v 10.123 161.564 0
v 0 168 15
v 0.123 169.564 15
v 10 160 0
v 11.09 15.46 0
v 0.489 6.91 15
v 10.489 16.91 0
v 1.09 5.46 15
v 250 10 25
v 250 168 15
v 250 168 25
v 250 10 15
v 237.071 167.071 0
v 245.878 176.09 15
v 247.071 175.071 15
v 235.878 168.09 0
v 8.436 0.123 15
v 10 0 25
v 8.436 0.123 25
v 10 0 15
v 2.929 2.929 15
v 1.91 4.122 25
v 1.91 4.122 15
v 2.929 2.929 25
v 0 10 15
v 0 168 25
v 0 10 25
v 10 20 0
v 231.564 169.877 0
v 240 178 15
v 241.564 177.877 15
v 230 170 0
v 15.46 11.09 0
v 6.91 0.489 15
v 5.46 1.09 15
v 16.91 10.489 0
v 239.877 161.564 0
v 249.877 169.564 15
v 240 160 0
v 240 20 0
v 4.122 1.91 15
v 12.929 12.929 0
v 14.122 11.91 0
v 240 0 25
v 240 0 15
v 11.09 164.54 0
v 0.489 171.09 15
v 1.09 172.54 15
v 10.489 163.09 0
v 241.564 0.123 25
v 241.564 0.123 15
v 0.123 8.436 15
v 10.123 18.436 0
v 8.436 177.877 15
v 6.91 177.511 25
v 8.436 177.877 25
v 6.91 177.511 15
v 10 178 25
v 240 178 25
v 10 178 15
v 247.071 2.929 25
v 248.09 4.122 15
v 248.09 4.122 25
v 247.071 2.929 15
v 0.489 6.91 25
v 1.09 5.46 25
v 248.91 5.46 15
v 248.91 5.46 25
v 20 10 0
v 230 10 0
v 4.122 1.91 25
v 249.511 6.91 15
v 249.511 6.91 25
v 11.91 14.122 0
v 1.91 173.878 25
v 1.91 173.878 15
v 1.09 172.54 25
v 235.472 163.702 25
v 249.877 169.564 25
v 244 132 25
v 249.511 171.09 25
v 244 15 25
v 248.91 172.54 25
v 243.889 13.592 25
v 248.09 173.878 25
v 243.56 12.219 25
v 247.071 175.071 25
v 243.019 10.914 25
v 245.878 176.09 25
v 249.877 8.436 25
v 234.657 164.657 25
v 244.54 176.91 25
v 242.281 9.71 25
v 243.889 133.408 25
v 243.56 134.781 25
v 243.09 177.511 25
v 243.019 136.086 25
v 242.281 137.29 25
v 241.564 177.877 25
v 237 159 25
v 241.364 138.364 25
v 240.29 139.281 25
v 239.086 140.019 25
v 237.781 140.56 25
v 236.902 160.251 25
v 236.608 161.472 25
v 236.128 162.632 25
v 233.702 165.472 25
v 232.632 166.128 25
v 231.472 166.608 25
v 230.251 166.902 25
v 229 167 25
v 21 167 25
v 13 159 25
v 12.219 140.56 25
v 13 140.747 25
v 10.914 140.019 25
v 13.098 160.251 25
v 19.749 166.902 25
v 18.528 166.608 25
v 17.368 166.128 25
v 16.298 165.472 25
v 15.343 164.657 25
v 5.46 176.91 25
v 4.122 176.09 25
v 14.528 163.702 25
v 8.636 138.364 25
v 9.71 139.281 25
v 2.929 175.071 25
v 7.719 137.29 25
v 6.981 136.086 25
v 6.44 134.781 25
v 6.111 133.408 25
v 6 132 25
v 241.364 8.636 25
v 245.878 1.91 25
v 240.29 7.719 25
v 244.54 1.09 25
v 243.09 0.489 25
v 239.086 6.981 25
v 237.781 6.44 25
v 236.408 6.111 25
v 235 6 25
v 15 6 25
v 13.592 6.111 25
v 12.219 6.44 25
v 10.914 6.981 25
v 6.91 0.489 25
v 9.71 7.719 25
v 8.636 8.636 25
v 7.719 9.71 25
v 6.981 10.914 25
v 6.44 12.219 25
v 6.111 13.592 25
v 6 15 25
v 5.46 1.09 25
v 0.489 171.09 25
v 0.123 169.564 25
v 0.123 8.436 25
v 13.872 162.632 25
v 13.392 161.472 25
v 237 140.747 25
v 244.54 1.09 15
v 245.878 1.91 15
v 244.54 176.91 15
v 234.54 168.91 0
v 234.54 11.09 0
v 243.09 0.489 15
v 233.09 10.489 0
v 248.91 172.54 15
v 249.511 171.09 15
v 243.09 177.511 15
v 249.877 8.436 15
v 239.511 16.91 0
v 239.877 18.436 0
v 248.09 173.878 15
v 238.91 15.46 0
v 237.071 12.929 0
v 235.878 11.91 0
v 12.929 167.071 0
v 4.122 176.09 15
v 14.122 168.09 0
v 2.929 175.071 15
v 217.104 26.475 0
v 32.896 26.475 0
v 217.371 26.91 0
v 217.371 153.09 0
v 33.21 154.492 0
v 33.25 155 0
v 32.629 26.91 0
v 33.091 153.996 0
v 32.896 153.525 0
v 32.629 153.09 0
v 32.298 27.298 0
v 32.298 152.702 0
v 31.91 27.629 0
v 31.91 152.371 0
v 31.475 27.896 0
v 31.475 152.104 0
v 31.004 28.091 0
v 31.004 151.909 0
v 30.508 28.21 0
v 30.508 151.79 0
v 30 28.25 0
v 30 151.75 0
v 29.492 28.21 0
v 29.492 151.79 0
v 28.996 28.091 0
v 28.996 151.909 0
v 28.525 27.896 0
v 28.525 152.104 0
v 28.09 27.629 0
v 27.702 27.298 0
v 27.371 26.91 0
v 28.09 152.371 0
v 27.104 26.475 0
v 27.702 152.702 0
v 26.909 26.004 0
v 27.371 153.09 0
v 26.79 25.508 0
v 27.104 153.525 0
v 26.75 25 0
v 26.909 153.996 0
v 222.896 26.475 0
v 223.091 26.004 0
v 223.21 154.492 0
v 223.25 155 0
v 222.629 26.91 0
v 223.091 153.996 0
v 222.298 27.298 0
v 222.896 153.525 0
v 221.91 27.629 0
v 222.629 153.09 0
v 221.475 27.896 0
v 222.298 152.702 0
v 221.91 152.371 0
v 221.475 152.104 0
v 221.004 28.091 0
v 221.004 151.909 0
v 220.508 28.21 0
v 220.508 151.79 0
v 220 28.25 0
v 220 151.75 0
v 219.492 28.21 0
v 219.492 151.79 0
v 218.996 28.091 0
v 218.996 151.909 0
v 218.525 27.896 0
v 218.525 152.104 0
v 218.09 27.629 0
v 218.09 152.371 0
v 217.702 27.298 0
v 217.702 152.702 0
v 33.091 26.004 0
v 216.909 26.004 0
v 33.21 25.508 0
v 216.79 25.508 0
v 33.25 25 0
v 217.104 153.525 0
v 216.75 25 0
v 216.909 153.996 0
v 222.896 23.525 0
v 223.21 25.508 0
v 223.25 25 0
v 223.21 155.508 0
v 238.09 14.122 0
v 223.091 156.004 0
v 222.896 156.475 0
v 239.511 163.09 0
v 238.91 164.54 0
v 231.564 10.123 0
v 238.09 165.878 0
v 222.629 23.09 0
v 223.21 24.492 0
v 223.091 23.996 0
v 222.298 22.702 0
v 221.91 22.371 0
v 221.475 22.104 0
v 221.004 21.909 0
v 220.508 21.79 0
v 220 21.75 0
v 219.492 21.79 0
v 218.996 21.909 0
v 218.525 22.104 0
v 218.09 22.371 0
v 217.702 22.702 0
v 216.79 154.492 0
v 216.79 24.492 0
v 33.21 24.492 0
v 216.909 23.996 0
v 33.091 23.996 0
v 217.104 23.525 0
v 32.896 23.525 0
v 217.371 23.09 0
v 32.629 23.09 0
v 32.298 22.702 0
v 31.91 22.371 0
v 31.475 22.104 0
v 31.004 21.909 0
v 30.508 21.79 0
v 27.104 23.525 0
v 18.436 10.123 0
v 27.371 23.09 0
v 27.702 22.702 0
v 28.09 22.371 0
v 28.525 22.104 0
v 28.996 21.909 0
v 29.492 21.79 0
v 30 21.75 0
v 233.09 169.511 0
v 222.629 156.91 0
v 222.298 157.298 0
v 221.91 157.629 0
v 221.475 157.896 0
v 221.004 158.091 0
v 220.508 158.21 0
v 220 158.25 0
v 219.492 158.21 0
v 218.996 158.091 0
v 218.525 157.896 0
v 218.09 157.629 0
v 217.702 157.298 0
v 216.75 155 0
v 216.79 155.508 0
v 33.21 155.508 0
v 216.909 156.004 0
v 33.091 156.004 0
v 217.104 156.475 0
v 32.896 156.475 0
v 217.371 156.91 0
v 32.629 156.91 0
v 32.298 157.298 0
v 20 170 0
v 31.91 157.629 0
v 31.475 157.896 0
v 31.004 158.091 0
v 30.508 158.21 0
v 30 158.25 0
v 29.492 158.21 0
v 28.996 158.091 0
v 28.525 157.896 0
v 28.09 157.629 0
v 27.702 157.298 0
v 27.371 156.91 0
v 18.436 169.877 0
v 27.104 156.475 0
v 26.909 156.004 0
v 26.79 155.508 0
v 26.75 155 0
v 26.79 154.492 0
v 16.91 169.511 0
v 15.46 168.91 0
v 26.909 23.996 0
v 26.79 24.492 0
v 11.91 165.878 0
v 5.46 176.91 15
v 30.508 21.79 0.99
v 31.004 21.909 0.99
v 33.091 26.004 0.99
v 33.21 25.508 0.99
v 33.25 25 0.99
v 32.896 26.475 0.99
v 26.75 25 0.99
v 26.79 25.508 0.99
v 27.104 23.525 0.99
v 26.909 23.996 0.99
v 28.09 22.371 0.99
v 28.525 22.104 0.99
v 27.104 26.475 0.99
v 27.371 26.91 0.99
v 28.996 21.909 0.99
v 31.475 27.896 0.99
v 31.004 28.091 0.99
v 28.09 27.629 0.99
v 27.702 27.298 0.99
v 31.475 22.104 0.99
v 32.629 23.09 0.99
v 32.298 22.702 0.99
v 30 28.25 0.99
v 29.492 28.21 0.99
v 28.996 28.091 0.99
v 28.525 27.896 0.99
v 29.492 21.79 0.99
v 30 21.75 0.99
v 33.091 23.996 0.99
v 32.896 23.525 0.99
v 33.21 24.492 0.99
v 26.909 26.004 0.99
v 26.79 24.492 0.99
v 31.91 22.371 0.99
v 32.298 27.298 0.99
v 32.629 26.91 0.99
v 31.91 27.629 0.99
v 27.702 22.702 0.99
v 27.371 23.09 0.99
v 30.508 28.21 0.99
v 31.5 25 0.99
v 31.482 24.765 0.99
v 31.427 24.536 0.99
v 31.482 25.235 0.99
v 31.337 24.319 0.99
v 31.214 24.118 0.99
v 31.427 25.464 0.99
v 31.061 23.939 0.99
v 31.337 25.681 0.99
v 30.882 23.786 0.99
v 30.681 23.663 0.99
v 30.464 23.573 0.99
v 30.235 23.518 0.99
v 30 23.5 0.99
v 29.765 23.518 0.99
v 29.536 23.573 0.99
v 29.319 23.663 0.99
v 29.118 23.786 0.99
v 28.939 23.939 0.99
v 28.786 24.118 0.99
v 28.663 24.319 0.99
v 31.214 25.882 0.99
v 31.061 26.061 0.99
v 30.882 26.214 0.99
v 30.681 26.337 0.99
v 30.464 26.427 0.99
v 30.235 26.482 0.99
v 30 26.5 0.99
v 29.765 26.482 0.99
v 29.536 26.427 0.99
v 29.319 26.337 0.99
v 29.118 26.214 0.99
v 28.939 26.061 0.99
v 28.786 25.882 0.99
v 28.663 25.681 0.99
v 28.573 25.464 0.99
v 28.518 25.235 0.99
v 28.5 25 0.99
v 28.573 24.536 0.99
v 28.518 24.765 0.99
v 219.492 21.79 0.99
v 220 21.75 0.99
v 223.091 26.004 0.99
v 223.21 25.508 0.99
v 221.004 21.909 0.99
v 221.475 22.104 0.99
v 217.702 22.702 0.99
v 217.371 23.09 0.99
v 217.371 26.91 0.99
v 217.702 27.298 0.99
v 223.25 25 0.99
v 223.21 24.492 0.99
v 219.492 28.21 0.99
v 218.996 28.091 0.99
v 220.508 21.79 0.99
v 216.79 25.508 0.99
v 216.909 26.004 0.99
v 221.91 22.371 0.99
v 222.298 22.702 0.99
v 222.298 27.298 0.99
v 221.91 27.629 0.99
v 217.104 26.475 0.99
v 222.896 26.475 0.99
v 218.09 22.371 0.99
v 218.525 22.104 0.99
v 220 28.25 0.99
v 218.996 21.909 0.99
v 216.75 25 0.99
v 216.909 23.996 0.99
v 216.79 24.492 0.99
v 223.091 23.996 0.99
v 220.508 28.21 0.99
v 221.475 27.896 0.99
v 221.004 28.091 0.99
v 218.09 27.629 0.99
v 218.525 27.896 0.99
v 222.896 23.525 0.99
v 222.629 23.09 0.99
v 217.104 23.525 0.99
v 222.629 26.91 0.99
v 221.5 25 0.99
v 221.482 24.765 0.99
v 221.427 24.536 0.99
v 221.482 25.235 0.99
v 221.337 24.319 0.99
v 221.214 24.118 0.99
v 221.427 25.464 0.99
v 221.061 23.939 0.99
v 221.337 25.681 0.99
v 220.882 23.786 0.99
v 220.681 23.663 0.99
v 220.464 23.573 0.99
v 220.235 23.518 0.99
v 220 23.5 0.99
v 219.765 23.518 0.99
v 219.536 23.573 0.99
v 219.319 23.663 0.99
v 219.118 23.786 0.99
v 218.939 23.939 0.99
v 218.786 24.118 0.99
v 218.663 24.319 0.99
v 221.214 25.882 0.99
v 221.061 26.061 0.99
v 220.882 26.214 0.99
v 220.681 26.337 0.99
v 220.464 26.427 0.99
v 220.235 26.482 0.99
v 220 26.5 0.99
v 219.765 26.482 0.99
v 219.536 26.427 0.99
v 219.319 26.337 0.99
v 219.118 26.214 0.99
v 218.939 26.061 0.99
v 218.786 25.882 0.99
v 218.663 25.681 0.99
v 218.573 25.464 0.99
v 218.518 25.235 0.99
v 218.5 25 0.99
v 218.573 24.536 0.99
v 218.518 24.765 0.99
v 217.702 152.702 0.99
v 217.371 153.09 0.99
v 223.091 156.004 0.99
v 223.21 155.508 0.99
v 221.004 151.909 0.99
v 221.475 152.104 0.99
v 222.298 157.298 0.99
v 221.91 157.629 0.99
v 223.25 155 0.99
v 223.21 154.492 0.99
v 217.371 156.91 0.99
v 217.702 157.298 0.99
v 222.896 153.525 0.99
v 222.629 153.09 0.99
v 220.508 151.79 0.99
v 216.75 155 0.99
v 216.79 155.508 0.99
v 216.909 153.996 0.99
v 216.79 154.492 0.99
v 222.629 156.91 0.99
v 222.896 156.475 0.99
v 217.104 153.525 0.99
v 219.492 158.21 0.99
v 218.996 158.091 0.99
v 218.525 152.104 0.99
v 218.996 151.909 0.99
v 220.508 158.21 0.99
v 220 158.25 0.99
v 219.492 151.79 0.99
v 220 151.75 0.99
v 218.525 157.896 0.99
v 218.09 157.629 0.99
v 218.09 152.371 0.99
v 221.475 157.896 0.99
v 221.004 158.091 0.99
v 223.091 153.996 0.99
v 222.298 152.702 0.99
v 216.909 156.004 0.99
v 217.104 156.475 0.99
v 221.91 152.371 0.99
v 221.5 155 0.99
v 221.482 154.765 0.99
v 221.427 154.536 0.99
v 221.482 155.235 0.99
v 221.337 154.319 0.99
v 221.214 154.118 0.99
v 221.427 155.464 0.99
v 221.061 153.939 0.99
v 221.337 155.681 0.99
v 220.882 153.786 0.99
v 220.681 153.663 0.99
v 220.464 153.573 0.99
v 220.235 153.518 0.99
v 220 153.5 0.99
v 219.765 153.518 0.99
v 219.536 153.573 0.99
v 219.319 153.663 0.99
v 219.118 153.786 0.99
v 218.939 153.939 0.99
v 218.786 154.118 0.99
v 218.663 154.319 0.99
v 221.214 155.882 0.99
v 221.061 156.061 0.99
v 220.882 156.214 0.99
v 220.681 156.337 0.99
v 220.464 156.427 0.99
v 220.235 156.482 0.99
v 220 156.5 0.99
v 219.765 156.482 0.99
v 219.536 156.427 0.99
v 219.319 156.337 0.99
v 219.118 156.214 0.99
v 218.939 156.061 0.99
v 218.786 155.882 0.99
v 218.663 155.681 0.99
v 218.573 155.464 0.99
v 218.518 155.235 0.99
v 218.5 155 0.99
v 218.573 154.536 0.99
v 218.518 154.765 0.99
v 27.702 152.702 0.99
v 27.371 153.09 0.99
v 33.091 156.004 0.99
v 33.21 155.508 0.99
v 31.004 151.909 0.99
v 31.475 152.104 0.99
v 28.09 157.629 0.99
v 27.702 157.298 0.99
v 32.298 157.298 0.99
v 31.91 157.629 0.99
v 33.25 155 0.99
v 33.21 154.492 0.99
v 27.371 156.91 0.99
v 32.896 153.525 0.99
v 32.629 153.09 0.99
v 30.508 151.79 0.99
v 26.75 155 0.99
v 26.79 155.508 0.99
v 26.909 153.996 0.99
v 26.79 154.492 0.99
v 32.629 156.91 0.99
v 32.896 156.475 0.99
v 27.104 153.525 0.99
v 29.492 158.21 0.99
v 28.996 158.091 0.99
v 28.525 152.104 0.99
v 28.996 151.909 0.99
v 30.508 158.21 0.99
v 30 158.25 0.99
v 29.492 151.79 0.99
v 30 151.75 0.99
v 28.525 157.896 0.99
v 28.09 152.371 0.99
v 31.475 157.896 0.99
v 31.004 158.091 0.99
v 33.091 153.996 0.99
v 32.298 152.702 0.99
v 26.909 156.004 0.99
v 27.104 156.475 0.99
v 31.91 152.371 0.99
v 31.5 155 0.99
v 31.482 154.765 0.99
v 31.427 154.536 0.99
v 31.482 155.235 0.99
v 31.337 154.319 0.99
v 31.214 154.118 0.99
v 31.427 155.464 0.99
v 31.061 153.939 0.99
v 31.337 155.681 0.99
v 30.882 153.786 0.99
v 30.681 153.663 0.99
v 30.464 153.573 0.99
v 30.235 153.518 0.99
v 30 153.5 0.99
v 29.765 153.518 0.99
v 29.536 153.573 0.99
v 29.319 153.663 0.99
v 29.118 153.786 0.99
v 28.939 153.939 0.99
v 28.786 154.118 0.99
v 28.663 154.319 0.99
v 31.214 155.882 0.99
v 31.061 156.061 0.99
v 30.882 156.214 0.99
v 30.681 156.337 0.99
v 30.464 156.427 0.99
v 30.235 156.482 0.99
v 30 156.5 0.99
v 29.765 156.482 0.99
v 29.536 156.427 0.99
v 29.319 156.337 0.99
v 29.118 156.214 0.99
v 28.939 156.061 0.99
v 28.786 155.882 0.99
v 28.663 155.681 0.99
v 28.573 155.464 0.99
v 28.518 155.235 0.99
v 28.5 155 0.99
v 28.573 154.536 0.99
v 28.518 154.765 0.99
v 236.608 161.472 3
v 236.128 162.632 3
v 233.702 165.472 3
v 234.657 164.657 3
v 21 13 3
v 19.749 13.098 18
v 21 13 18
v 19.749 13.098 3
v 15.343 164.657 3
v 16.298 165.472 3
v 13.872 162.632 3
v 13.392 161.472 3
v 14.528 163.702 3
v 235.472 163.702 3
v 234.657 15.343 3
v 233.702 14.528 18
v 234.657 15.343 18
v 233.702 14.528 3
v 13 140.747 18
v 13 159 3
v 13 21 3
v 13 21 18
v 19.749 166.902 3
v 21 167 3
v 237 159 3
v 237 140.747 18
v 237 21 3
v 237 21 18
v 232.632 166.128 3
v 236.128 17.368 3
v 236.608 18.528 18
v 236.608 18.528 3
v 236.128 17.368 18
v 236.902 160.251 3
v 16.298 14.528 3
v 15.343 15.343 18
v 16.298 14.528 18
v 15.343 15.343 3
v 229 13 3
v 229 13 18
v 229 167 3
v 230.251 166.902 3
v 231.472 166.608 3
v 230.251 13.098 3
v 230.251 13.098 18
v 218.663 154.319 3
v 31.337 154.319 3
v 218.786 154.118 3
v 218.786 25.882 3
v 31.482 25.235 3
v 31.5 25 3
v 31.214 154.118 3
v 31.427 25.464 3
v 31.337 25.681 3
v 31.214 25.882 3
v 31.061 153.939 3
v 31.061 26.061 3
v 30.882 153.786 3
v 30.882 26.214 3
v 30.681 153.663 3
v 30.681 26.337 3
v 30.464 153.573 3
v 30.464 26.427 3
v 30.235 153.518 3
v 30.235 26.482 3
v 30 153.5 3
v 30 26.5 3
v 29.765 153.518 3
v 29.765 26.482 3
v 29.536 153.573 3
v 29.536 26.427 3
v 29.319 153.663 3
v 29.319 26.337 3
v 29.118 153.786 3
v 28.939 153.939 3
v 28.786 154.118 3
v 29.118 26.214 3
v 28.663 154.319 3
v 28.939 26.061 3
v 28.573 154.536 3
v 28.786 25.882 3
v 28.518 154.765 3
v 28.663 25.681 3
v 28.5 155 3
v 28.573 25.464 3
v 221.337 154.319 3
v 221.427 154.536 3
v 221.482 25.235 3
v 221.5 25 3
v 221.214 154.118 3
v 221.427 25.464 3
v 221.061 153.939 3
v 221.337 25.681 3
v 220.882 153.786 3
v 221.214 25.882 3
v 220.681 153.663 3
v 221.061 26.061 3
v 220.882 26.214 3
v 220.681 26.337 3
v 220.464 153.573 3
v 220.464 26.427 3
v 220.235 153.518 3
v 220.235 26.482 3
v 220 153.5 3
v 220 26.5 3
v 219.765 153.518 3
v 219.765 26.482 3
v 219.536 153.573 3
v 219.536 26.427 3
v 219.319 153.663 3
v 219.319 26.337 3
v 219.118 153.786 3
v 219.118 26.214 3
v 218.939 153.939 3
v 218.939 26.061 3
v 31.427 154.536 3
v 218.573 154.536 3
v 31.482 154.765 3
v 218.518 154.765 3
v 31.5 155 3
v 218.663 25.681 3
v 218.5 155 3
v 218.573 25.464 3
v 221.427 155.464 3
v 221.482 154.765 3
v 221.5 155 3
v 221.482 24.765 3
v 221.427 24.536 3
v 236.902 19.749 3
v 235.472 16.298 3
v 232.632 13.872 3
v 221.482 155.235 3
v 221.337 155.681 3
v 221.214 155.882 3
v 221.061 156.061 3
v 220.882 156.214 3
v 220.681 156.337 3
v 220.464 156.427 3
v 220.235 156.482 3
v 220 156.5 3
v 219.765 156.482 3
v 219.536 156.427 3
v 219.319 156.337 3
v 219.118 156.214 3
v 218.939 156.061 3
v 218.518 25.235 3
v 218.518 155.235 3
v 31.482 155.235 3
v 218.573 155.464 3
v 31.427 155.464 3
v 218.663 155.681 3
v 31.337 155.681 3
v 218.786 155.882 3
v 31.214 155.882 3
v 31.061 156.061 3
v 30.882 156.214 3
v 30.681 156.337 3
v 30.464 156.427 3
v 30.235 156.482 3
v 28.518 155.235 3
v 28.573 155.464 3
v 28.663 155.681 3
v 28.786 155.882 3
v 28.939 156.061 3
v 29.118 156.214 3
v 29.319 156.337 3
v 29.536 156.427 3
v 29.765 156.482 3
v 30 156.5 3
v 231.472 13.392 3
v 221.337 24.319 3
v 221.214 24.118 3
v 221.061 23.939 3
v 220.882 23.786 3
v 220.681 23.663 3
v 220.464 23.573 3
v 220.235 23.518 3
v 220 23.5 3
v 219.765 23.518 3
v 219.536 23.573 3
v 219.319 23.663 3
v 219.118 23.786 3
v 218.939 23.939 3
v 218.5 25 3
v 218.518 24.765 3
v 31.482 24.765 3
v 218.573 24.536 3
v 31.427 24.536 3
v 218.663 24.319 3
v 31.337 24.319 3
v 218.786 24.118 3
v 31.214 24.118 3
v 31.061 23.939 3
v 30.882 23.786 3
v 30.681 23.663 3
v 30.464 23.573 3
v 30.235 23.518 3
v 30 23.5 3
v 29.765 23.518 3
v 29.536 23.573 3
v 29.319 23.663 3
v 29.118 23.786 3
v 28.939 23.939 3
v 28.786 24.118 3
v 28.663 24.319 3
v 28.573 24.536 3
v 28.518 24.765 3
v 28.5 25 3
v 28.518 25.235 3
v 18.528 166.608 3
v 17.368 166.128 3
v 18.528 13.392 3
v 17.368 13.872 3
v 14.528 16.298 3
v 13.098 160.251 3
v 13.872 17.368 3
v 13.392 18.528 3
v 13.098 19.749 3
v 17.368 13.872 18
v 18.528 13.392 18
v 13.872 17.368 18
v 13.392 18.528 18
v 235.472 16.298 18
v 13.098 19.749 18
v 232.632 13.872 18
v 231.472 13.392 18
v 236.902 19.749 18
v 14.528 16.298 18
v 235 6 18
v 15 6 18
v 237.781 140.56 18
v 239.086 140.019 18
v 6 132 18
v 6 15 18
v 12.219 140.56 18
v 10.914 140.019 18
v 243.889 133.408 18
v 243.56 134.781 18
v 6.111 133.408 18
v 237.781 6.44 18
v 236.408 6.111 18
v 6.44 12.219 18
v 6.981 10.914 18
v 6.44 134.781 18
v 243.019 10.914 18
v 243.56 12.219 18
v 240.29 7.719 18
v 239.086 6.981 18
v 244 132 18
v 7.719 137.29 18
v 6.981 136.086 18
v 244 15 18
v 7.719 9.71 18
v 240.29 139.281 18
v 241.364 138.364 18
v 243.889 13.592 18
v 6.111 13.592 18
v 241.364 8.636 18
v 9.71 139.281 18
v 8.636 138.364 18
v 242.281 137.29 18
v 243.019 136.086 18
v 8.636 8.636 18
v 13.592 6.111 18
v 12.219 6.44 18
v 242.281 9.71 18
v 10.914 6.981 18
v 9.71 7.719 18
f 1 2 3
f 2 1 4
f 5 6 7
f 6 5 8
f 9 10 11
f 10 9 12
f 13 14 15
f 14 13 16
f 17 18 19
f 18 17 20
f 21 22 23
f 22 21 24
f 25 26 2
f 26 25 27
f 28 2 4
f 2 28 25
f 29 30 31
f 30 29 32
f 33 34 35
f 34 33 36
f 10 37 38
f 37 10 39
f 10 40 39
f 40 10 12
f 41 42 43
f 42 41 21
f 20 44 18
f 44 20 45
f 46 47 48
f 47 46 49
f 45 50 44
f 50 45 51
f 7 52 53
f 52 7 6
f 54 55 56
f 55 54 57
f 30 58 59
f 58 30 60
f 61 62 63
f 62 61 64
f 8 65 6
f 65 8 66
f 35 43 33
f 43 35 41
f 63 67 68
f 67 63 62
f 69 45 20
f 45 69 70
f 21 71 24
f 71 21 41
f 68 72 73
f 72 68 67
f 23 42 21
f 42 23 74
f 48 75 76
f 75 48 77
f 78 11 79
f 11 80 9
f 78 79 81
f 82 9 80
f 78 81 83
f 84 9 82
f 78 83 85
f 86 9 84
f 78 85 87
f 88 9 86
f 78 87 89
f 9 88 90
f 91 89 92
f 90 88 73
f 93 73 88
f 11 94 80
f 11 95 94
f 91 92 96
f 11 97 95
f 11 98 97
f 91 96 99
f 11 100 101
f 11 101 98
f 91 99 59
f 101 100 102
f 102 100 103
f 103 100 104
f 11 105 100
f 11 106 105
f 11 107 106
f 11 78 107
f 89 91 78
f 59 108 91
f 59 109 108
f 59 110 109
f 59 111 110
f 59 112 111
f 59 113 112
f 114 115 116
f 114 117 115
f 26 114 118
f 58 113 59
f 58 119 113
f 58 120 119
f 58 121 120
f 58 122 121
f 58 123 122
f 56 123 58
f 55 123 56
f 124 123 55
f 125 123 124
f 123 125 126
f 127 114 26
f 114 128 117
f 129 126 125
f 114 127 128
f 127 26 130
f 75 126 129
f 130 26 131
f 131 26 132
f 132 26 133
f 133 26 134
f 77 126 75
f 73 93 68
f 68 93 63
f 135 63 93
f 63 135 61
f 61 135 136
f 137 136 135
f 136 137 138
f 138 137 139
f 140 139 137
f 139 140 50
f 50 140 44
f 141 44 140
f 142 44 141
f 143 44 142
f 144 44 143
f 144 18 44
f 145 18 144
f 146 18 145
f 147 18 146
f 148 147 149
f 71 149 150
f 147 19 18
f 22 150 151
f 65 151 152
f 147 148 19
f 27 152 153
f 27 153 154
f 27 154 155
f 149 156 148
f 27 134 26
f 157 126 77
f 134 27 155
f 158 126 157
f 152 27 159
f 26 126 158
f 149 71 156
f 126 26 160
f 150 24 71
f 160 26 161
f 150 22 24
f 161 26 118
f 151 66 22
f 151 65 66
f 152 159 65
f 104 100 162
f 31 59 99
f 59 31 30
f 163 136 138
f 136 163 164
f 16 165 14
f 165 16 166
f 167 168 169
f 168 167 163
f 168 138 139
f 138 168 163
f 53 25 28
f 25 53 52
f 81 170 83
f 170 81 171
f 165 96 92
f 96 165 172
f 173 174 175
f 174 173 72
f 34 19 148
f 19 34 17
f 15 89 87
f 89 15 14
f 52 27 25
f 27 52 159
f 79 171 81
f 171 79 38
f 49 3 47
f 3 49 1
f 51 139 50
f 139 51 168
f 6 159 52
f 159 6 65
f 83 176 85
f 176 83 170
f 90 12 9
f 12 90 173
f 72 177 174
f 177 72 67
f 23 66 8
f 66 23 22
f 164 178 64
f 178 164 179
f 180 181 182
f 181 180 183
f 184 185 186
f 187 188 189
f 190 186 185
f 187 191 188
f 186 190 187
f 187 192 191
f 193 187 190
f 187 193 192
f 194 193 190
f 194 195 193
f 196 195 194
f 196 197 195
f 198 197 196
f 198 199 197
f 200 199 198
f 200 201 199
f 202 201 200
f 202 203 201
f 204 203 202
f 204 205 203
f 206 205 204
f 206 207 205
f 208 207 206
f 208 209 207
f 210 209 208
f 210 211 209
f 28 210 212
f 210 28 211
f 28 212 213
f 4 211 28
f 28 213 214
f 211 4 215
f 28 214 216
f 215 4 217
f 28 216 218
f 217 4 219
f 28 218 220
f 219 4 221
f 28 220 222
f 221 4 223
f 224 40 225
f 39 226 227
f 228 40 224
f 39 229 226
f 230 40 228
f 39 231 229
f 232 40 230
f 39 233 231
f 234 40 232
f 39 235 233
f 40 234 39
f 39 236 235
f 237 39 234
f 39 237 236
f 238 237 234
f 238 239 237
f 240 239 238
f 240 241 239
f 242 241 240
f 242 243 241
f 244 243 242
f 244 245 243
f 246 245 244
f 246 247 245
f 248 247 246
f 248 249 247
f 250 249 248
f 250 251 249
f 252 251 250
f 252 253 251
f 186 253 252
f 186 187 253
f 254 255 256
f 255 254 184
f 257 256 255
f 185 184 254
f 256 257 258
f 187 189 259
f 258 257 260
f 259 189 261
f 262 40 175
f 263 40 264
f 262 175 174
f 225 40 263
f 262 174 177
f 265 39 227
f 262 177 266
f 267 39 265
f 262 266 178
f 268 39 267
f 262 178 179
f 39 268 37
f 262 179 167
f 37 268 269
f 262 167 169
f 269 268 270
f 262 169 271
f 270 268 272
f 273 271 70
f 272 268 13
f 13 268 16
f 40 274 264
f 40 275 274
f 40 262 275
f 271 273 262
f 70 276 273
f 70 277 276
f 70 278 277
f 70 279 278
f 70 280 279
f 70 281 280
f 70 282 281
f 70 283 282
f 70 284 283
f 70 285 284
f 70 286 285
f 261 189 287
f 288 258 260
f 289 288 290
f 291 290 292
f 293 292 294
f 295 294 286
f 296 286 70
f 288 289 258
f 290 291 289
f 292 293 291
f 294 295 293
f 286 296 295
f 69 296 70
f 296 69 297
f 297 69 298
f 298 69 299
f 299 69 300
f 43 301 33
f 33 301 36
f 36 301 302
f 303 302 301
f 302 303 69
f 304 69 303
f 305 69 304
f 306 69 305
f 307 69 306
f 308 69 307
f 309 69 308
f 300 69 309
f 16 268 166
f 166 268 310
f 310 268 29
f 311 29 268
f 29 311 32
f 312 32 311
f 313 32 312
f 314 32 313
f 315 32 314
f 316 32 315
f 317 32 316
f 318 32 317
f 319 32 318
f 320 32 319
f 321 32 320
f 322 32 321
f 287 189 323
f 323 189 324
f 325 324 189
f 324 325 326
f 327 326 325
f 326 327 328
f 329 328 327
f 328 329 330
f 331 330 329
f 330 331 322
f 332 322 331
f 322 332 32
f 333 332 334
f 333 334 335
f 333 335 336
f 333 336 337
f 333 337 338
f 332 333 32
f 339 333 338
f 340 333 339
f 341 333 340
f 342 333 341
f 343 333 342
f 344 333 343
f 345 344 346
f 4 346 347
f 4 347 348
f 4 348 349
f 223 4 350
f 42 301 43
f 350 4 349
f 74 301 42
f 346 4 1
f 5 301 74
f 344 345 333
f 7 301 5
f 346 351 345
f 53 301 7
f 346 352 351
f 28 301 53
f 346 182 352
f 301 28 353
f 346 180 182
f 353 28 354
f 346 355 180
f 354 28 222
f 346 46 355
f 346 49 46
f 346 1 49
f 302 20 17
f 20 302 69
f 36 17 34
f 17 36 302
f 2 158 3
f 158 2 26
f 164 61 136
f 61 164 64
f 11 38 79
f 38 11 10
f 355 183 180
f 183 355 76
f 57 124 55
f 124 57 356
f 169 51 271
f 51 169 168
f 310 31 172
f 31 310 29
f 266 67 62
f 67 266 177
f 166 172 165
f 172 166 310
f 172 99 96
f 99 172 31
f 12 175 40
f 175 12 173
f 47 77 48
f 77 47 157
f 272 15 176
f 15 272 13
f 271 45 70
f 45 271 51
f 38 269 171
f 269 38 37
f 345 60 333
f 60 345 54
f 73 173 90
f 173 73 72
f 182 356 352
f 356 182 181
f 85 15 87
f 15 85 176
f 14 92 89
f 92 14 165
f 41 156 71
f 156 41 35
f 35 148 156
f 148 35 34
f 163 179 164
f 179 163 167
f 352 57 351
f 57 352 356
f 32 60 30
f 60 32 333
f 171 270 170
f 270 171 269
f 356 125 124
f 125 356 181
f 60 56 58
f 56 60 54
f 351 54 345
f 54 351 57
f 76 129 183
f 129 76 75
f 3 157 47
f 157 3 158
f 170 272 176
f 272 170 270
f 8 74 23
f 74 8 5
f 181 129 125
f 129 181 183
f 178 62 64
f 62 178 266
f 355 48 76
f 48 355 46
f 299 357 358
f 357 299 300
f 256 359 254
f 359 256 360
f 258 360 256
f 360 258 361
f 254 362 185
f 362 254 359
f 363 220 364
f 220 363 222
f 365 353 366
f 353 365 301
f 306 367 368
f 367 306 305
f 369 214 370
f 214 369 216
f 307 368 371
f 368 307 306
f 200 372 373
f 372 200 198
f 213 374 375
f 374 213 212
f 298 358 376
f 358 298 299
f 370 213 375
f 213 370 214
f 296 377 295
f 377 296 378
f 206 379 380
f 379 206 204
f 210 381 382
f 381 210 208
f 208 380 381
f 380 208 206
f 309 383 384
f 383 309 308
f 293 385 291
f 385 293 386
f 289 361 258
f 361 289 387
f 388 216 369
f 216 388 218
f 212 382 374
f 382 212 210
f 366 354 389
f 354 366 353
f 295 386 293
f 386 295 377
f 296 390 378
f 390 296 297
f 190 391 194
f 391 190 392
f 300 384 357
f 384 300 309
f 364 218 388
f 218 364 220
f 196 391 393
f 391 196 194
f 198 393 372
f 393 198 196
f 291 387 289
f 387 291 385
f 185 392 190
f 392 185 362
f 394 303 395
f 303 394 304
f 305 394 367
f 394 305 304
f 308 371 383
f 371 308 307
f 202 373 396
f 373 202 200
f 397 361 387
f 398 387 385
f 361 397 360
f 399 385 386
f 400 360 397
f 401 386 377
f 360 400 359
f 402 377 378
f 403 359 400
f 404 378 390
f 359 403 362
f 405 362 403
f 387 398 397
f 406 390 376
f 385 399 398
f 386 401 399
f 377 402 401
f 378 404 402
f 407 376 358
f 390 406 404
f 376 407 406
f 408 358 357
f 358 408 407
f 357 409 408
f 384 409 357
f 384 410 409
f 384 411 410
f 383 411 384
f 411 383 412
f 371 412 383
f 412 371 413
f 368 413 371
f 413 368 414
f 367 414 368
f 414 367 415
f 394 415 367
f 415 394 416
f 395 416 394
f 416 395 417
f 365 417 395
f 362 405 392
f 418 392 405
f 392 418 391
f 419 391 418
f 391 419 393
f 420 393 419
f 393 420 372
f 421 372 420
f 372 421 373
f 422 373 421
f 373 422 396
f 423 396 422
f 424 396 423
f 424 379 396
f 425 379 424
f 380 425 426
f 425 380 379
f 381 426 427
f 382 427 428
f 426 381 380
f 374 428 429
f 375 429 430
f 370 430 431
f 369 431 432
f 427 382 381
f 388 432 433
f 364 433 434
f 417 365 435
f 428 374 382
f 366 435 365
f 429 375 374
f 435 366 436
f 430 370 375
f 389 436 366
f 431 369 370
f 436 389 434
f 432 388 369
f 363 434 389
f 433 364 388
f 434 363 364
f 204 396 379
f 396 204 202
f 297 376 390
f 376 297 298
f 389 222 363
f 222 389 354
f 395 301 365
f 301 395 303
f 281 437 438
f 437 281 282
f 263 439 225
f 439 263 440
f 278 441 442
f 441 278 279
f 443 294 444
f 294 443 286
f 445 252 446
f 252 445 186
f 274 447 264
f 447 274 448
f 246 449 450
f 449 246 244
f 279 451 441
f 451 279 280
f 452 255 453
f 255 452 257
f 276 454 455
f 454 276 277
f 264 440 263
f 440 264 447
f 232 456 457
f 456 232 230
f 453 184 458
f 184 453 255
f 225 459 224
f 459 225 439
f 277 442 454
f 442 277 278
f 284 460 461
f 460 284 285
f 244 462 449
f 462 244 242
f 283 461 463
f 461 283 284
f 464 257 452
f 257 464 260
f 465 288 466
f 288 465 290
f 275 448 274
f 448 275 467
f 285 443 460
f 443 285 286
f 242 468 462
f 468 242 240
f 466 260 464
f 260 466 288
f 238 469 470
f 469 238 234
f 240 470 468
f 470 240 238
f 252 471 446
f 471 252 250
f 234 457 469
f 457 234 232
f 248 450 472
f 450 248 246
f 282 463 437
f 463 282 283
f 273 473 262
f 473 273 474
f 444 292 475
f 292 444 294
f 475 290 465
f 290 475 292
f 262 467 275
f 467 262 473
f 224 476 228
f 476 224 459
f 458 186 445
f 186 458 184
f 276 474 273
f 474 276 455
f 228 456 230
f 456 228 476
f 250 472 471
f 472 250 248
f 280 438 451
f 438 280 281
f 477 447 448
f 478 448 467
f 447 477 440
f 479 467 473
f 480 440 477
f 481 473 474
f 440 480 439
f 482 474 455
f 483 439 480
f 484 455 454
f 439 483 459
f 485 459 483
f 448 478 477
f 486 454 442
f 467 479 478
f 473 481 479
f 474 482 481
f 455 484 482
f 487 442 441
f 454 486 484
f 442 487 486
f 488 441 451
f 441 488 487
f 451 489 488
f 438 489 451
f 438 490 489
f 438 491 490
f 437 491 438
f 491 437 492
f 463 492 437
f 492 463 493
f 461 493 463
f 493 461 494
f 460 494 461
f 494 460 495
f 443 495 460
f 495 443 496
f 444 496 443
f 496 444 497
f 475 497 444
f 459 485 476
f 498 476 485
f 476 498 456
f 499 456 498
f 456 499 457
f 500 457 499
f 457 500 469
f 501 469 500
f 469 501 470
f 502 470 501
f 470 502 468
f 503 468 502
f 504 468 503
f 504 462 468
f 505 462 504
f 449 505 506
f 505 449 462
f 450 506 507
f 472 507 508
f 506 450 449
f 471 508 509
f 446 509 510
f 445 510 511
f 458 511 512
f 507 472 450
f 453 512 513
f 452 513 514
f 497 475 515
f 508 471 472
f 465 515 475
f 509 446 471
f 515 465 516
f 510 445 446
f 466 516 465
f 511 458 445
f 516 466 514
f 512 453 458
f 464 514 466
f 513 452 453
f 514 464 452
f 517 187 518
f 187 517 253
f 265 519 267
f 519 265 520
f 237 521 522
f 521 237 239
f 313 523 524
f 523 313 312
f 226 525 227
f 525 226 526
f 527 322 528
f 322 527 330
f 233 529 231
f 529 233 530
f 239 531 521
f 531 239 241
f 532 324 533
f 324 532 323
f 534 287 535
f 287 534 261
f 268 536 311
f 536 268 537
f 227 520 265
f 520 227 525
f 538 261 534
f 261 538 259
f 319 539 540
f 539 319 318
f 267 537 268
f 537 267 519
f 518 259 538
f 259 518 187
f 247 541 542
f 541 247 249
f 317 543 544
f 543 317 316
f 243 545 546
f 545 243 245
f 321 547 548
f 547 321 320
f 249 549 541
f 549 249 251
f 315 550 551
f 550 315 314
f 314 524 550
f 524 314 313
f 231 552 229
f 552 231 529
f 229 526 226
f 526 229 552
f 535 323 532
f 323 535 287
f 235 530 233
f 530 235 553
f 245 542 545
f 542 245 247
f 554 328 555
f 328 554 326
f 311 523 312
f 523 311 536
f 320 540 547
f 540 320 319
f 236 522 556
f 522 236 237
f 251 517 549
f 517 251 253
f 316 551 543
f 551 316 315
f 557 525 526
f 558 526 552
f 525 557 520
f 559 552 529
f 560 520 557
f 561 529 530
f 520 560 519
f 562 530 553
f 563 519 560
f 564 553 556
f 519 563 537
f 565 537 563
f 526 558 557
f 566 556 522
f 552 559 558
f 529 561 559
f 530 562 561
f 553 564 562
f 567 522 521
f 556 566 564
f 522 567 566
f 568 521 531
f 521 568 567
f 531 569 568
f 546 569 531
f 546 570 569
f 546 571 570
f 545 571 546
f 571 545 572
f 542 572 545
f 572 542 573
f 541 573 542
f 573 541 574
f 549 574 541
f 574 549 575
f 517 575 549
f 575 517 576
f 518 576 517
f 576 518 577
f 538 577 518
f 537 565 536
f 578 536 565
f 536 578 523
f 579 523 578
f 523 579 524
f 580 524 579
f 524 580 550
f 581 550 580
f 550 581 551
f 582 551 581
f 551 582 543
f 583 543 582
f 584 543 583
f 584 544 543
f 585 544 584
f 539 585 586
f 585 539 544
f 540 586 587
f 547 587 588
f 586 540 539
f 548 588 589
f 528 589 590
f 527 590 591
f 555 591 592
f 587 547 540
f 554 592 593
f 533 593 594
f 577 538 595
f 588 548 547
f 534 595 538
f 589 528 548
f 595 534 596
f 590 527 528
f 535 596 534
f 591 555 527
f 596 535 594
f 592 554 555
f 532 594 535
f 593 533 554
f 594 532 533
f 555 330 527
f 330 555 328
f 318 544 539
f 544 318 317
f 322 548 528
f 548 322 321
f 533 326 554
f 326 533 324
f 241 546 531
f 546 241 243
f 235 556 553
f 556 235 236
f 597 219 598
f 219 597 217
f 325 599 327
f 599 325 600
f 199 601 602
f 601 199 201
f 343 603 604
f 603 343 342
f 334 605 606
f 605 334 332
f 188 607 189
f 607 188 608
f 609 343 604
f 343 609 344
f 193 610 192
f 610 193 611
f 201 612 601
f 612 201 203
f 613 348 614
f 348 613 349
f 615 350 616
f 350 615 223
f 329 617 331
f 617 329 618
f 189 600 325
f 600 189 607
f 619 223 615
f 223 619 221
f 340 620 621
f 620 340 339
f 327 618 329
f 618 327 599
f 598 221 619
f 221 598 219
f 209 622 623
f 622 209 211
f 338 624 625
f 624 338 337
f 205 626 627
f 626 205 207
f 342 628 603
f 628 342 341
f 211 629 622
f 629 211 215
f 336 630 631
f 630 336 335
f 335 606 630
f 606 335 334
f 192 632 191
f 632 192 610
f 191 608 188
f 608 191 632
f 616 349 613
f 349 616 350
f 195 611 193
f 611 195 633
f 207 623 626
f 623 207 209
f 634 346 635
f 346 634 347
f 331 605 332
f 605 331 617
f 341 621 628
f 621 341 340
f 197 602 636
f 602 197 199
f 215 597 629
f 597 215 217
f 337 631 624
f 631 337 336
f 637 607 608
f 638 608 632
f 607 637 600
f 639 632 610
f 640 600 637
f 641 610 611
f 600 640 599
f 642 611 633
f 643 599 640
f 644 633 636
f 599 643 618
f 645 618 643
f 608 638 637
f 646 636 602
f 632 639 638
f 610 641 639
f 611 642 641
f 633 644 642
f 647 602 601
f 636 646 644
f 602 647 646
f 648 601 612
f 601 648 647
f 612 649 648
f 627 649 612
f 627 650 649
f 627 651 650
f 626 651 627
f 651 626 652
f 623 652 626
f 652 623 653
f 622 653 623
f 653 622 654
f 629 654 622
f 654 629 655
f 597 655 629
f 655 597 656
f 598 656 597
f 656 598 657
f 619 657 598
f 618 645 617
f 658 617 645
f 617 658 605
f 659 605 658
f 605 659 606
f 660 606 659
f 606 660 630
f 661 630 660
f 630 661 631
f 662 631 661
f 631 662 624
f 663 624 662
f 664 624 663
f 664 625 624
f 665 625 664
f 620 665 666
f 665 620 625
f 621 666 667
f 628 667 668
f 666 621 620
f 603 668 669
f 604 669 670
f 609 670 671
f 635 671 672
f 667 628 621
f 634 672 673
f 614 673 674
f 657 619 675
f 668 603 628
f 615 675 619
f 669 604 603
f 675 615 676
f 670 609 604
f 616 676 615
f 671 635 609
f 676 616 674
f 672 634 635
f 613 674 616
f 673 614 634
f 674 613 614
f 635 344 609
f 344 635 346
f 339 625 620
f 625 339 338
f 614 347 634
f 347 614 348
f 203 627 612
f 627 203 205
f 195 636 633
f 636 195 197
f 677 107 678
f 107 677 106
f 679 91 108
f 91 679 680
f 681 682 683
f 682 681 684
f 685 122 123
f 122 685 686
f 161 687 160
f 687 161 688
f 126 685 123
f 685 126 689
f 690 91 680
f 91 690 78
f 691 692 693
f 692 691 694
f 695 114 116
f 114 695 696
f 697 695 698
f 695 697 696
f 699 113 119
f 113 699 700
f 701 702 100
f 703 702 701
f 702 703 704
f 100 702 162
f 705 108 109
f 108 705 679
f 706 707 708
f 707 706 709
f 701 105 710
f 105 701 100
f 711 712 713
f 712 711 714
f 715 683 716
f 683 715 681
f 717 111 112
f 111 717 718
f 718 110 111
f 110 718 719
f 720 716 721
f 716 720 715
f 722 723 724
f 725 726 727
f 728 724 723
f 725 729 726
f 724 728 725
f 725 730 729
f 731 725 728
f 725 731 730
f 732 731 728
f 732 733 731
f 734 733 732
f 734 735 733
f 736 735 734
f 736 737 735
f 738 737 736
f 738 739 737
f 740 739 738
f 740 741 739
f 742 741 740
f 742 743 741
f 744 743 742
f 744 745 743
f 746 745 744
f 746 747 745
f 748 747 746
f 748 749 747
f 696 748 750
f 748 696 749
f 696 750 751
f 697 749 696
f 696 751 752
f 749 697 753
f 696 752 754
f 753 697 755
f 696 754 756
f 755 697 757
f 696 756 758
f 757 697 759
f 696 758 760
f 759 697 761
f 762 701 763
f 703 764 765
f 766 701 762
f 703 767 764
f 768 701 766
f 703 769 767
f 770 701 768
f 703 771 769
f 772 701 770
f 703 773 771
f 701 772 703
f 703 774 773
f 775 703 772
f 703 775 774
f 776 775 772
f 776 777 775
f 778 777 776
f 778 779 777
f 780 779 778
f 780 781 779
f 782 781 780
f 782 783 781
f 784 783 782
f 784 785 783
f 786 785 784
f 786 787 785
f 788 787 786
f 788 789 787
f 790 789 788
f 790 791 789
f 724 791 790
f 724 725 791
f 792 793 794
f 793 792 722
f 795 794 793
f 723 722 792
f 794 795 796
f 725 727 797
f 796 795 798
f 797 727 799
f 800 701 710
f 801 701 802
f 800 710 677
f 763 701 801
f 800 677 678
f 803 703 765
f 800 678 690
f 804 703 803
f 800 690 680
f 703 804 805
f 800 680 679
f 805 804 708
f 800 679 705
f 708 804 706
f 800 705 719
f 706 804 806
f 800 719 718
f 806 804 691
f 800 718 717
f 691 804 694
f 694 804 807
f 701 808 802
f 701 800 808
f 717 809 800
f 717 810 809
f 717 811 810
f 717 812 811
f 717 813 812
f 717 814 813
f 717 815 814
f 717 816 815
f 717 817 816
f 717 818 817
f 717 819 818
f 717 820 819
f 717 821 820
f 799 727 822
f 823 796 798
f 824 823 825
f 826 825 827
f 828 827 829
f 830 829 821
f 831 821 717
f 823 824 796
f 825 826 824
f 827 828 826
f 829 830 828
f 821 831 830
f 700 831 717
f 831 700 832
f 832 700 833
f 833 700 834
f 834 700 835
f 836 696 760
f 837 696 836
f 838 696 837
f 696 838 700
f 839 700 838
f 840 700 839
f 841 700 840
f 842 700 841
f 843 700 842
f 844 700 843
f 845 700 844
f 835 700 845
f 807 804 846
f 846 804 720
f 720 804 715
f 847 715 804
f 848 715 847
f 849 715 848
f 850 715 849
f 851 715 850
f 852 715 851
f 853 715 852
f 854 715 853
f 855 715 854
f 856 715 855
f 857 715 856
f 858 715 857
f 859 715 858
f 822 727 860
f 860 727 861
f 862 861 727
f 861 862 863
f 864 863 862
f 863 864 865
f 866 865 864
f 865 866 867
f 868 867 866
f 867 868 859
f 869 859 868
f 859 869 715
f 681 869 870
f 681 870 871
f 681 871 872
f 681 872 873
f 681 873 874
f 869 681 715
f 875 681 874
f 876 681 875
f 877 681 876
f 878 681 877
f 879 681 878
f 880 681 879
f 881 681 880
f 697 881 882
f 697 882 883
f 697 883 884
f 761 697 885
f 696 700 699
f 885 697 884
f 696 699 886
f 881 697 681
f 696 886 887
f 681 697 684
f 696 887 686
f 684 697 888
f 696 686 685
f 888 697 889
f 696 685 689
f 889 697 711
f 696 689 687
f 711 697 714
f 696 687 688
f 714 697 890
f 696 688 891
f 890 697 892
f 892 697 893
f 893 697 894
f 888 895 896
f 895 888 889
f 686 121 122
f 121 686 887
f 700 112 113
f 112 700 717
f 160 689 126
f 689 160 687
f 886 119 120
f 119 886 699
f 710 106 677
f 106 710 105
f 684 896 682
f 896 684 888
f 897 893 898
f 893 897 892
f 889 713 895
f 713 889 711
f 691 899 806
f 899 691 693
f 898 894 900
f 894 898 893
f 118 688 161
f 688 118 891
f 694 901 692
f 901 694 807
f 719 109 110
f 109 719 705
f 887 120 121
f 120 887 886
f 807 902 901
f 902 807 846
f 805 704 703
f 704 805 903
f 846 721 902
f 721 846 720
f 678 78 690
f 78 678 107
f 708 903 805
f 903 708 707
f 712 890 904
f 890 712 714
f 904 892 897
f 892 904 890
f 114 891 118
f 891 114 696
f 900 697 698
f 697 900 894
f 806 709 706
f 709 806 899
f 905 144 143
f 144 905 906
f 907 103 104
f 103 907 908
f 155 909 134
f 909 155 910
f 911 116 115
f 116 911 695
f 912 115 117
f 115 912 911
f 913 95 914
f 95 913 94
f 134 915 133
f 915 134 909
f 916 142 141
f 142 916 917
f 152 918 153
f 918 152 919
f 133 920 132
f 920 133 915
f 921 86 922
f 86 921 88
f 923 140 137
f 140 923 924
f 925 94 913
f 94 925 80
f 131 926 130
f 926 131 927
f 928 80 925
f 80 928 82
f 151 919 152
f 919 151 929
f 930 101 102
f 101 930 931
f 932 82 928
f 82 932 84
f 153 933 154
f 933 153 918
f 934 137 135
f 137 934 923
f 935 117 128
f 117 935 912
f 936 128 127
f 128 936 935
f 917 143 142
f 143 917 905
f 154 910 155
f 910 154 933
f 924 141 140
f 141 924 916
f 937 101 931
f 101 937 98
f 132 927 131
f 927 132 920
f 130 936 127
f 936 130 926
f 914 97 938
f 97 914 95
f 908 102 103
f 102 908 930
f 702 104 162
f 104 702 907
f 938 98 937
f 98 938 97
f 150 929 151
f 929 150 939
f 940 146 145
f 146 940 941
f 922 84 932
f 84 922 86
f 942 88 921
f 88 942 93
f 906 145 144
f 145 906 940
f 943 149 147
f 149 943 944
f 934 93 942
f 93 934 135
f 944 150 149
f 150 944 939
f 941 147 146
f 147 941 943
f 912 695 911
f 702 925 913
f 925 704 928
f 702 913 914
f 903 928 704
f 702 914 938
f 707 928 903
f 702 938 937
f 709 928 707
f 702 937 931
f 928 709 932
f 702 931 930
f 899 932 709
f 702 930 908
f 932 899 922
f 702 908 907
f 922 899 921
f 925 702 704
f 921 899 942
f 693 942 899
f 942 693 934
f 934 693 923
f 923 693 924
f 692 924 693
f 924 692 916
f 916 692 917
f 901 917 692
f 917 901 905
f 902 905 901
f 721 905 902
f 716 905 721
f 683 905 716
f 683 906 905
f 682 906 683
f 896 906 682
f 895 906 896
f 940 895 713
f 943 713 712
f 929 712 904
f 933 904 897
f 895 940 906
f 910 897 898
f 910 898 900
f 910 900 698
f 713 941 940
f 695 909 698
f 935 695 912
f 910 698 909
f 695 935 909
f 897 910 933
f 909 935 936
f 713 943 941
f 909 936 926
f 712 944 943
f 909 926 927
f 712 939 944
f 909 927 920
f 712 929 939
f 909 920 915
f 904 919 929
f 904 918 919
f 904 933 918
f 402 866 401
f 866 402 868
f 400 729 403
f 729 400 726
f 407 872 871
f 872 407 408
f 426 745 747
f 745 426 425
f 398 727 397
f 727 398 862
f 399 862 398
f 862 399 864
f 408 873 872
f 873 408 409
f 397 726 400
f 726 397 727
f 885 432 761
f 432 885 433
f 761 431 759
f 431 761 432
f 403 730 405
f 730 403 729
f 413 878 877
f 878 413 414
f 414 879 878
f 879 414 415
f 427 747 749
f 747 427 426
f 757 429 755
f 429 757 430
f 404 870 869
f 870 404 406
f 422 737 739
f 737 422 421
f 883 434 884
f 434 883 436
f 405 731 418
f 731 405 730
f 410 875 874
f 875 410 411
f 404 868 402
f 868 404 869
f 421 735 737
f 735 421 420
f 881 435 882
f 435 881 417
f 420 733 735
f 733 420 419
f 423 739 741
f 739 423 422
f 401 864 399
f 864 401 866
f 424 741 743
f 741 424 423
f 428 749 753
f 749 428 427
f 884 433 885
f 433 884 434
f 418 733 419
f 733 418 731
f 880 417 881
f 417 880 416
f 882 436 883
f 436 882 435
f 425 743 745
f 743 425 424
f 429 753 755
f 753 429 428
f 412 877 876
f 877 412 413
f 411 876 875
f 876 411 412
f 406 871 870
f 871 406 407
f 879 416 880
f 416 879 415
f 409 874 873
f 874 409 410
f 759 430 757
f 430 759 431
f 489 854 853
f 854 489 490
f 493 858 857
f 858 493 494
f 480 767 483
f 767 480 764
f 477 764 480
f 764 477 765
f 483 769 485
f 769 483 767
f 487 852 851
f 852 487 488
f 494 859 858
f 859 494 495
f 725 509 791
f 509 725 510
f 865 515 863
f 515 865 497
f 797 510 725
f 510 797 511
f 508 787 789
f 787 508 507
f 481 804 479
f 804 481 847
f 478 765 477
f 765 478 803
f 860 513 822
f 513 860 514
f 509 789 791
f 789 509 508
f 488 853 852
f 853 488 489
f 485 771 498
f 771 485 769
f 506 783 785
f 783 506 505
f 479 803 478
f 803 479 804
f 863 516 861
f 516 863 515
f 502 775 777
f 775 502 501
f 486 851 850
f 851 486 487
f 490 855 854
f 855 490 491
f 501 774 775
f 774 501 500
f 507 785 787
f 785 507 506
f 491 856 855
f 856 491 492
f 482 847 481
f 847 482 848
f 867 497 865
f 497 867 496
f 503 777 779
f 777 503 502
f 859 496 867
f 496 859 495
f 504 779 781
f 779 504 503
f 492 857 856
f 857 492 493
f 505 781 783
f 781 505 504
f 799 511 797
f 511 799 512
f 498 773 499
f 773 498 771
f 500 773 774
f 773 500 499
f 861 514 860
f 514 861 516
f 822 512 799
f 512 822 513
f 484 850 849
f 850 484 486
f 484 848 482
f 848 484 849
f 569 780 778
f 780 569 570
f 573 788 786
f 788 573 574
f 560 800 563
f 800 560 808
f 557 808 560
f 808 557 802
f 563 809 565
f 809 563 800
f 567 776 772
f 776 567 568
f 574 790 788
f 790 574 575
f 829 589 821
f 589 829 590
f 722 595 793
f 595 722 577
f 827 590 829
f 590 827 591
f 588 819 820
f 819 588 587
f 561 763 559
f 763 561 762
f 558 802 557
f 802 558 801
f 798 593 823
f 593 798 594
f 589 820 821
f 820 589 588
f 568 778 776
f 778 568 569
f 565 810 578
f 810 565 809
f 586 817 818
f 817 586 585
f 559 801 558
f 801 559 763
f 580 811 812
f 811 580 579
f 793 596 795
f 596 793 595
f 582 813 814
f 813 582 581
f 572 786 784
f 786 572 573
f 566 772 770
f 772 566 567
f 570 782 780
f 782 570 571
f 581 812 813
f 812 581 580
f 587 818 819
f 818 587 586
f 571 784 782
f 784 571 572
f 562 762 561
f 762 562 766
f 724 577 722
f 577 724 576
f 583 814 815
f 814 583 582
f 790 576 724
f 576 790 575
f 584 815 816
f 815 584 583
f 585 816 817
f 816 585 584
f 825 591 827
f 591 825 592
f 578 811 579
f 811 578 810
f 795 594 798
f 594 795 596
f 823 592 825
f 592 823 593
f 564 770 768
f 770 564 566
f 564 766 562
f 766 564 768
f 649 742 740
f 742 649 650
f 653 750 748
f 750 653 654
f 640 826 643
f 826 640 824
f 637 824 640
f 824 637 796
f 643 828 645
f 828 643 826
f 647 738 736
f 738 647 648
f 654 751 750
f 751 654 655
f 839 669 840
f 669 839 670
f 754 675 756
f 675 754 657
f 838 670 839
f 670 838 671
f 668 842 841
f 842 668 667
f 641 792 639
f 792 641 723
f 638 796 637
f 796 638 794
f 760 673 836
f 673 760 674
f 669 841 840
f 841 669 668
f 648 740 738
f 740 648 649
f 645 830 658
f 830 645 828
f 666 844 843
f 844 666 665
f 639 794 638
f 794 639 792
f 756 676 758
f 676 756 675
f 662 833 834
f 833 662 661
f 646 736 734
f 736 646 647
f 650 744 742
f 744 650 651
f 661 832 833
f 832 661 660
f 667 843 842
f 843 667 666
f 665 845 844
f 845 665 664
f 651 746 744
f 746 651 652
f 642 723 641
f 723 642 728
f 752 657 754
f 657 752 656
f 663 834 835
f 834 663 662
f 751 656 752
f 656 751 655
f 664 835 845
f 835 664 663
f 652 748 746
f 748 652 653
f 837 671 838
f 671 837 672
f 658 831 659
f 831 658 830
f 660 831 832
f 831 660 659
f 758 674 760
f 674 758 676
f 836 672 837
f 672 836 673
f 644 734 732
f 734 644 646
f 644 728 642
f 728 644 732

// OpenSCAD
$fn = 40;
bottom();
module top(){
difference(){
translate([0,0,-20])plate(249.5,178.5,10,20);
translate([5,5,-23])plate(240,168.5,5,20);
    
    translate([90,8,-10])cube([151,46,40]);
    translate([55,68,-10])cube([175,100,30]);
    
    translate([50,62,-0.5])plate(194,112,8,4);
    translate([12,142,-5])neutrik();
    translate([12,110,-5])neutrik();
    translate([12,78,-5])neutrik();

    translate([12,18,-5])neutrik();
}

translate([0,56,-20])cube([249.5,5,19]);
translate([44,0,-20])cube([5,178,19]);
}
module neutrik(){
    hull(){
        translate([0,0,0])cylinder(d=2,h=2);
        translate([24,29,0])cylinder(d=2,h=2);
        translate([24,0,0])cylinder(d=2,h=2);
        translate([0,29,0])cylinder(d=2,h=2);
    }
    translate([12,14.5,2])cylinder(d=24,h=5);
    translate([2.5,26.5,2])cylinder(d=3.2,h=5);
    translate([2.5+19,26.5-24,2])cylinder(d=3.2,h=5);
}

//difference(){
//    bottom();
//    translate([125,-10,-10])cube([300,300,300]);
//}

module bottom(){
difference(){
hull(){
translate([0,0,15])plate(250,178,10,10);
translate([10,10,0])plate(230,160,10,15);
    
}
translate([30,25,-0.01])cylinder(d=6.5,h=1);
translate([30+190,25,-0.01])cylinder(d=6.5,h=1);
translate([30+190,130+25,-0.01])cylinder(d=6.5,h=1);
translate([30,130+25,-0.01])cylinder(d=6.5,h=1);

translate([13,13,3])plate(224,154,8,30);

translate([6,6,18])plate(238,135,9,10);

translate([30,25,-0.01])cylinder(d=3,h=10);
translate([30+190,25,-0.01])cylinder(d=3,h=10);
translate([30+190,130+25,-0.01])cylinder(d=3,h=10);
translate([30,130+25,-0.01])cylinder(d=3,h=10);
}

}

module plate(width,depth,corner,height){hull(){
    translate([corner, corner, 0])cylinder(r=corner,h=height);
    translate([width-corner, corner, 0])cylinder(r=corner,h=height);
    translate([width-corner, depth-corner, 0])cylinder(r=corner,h=height);
    translate([corner, depth-corner, 0])cylinder(r=corner,h=height);
}}
